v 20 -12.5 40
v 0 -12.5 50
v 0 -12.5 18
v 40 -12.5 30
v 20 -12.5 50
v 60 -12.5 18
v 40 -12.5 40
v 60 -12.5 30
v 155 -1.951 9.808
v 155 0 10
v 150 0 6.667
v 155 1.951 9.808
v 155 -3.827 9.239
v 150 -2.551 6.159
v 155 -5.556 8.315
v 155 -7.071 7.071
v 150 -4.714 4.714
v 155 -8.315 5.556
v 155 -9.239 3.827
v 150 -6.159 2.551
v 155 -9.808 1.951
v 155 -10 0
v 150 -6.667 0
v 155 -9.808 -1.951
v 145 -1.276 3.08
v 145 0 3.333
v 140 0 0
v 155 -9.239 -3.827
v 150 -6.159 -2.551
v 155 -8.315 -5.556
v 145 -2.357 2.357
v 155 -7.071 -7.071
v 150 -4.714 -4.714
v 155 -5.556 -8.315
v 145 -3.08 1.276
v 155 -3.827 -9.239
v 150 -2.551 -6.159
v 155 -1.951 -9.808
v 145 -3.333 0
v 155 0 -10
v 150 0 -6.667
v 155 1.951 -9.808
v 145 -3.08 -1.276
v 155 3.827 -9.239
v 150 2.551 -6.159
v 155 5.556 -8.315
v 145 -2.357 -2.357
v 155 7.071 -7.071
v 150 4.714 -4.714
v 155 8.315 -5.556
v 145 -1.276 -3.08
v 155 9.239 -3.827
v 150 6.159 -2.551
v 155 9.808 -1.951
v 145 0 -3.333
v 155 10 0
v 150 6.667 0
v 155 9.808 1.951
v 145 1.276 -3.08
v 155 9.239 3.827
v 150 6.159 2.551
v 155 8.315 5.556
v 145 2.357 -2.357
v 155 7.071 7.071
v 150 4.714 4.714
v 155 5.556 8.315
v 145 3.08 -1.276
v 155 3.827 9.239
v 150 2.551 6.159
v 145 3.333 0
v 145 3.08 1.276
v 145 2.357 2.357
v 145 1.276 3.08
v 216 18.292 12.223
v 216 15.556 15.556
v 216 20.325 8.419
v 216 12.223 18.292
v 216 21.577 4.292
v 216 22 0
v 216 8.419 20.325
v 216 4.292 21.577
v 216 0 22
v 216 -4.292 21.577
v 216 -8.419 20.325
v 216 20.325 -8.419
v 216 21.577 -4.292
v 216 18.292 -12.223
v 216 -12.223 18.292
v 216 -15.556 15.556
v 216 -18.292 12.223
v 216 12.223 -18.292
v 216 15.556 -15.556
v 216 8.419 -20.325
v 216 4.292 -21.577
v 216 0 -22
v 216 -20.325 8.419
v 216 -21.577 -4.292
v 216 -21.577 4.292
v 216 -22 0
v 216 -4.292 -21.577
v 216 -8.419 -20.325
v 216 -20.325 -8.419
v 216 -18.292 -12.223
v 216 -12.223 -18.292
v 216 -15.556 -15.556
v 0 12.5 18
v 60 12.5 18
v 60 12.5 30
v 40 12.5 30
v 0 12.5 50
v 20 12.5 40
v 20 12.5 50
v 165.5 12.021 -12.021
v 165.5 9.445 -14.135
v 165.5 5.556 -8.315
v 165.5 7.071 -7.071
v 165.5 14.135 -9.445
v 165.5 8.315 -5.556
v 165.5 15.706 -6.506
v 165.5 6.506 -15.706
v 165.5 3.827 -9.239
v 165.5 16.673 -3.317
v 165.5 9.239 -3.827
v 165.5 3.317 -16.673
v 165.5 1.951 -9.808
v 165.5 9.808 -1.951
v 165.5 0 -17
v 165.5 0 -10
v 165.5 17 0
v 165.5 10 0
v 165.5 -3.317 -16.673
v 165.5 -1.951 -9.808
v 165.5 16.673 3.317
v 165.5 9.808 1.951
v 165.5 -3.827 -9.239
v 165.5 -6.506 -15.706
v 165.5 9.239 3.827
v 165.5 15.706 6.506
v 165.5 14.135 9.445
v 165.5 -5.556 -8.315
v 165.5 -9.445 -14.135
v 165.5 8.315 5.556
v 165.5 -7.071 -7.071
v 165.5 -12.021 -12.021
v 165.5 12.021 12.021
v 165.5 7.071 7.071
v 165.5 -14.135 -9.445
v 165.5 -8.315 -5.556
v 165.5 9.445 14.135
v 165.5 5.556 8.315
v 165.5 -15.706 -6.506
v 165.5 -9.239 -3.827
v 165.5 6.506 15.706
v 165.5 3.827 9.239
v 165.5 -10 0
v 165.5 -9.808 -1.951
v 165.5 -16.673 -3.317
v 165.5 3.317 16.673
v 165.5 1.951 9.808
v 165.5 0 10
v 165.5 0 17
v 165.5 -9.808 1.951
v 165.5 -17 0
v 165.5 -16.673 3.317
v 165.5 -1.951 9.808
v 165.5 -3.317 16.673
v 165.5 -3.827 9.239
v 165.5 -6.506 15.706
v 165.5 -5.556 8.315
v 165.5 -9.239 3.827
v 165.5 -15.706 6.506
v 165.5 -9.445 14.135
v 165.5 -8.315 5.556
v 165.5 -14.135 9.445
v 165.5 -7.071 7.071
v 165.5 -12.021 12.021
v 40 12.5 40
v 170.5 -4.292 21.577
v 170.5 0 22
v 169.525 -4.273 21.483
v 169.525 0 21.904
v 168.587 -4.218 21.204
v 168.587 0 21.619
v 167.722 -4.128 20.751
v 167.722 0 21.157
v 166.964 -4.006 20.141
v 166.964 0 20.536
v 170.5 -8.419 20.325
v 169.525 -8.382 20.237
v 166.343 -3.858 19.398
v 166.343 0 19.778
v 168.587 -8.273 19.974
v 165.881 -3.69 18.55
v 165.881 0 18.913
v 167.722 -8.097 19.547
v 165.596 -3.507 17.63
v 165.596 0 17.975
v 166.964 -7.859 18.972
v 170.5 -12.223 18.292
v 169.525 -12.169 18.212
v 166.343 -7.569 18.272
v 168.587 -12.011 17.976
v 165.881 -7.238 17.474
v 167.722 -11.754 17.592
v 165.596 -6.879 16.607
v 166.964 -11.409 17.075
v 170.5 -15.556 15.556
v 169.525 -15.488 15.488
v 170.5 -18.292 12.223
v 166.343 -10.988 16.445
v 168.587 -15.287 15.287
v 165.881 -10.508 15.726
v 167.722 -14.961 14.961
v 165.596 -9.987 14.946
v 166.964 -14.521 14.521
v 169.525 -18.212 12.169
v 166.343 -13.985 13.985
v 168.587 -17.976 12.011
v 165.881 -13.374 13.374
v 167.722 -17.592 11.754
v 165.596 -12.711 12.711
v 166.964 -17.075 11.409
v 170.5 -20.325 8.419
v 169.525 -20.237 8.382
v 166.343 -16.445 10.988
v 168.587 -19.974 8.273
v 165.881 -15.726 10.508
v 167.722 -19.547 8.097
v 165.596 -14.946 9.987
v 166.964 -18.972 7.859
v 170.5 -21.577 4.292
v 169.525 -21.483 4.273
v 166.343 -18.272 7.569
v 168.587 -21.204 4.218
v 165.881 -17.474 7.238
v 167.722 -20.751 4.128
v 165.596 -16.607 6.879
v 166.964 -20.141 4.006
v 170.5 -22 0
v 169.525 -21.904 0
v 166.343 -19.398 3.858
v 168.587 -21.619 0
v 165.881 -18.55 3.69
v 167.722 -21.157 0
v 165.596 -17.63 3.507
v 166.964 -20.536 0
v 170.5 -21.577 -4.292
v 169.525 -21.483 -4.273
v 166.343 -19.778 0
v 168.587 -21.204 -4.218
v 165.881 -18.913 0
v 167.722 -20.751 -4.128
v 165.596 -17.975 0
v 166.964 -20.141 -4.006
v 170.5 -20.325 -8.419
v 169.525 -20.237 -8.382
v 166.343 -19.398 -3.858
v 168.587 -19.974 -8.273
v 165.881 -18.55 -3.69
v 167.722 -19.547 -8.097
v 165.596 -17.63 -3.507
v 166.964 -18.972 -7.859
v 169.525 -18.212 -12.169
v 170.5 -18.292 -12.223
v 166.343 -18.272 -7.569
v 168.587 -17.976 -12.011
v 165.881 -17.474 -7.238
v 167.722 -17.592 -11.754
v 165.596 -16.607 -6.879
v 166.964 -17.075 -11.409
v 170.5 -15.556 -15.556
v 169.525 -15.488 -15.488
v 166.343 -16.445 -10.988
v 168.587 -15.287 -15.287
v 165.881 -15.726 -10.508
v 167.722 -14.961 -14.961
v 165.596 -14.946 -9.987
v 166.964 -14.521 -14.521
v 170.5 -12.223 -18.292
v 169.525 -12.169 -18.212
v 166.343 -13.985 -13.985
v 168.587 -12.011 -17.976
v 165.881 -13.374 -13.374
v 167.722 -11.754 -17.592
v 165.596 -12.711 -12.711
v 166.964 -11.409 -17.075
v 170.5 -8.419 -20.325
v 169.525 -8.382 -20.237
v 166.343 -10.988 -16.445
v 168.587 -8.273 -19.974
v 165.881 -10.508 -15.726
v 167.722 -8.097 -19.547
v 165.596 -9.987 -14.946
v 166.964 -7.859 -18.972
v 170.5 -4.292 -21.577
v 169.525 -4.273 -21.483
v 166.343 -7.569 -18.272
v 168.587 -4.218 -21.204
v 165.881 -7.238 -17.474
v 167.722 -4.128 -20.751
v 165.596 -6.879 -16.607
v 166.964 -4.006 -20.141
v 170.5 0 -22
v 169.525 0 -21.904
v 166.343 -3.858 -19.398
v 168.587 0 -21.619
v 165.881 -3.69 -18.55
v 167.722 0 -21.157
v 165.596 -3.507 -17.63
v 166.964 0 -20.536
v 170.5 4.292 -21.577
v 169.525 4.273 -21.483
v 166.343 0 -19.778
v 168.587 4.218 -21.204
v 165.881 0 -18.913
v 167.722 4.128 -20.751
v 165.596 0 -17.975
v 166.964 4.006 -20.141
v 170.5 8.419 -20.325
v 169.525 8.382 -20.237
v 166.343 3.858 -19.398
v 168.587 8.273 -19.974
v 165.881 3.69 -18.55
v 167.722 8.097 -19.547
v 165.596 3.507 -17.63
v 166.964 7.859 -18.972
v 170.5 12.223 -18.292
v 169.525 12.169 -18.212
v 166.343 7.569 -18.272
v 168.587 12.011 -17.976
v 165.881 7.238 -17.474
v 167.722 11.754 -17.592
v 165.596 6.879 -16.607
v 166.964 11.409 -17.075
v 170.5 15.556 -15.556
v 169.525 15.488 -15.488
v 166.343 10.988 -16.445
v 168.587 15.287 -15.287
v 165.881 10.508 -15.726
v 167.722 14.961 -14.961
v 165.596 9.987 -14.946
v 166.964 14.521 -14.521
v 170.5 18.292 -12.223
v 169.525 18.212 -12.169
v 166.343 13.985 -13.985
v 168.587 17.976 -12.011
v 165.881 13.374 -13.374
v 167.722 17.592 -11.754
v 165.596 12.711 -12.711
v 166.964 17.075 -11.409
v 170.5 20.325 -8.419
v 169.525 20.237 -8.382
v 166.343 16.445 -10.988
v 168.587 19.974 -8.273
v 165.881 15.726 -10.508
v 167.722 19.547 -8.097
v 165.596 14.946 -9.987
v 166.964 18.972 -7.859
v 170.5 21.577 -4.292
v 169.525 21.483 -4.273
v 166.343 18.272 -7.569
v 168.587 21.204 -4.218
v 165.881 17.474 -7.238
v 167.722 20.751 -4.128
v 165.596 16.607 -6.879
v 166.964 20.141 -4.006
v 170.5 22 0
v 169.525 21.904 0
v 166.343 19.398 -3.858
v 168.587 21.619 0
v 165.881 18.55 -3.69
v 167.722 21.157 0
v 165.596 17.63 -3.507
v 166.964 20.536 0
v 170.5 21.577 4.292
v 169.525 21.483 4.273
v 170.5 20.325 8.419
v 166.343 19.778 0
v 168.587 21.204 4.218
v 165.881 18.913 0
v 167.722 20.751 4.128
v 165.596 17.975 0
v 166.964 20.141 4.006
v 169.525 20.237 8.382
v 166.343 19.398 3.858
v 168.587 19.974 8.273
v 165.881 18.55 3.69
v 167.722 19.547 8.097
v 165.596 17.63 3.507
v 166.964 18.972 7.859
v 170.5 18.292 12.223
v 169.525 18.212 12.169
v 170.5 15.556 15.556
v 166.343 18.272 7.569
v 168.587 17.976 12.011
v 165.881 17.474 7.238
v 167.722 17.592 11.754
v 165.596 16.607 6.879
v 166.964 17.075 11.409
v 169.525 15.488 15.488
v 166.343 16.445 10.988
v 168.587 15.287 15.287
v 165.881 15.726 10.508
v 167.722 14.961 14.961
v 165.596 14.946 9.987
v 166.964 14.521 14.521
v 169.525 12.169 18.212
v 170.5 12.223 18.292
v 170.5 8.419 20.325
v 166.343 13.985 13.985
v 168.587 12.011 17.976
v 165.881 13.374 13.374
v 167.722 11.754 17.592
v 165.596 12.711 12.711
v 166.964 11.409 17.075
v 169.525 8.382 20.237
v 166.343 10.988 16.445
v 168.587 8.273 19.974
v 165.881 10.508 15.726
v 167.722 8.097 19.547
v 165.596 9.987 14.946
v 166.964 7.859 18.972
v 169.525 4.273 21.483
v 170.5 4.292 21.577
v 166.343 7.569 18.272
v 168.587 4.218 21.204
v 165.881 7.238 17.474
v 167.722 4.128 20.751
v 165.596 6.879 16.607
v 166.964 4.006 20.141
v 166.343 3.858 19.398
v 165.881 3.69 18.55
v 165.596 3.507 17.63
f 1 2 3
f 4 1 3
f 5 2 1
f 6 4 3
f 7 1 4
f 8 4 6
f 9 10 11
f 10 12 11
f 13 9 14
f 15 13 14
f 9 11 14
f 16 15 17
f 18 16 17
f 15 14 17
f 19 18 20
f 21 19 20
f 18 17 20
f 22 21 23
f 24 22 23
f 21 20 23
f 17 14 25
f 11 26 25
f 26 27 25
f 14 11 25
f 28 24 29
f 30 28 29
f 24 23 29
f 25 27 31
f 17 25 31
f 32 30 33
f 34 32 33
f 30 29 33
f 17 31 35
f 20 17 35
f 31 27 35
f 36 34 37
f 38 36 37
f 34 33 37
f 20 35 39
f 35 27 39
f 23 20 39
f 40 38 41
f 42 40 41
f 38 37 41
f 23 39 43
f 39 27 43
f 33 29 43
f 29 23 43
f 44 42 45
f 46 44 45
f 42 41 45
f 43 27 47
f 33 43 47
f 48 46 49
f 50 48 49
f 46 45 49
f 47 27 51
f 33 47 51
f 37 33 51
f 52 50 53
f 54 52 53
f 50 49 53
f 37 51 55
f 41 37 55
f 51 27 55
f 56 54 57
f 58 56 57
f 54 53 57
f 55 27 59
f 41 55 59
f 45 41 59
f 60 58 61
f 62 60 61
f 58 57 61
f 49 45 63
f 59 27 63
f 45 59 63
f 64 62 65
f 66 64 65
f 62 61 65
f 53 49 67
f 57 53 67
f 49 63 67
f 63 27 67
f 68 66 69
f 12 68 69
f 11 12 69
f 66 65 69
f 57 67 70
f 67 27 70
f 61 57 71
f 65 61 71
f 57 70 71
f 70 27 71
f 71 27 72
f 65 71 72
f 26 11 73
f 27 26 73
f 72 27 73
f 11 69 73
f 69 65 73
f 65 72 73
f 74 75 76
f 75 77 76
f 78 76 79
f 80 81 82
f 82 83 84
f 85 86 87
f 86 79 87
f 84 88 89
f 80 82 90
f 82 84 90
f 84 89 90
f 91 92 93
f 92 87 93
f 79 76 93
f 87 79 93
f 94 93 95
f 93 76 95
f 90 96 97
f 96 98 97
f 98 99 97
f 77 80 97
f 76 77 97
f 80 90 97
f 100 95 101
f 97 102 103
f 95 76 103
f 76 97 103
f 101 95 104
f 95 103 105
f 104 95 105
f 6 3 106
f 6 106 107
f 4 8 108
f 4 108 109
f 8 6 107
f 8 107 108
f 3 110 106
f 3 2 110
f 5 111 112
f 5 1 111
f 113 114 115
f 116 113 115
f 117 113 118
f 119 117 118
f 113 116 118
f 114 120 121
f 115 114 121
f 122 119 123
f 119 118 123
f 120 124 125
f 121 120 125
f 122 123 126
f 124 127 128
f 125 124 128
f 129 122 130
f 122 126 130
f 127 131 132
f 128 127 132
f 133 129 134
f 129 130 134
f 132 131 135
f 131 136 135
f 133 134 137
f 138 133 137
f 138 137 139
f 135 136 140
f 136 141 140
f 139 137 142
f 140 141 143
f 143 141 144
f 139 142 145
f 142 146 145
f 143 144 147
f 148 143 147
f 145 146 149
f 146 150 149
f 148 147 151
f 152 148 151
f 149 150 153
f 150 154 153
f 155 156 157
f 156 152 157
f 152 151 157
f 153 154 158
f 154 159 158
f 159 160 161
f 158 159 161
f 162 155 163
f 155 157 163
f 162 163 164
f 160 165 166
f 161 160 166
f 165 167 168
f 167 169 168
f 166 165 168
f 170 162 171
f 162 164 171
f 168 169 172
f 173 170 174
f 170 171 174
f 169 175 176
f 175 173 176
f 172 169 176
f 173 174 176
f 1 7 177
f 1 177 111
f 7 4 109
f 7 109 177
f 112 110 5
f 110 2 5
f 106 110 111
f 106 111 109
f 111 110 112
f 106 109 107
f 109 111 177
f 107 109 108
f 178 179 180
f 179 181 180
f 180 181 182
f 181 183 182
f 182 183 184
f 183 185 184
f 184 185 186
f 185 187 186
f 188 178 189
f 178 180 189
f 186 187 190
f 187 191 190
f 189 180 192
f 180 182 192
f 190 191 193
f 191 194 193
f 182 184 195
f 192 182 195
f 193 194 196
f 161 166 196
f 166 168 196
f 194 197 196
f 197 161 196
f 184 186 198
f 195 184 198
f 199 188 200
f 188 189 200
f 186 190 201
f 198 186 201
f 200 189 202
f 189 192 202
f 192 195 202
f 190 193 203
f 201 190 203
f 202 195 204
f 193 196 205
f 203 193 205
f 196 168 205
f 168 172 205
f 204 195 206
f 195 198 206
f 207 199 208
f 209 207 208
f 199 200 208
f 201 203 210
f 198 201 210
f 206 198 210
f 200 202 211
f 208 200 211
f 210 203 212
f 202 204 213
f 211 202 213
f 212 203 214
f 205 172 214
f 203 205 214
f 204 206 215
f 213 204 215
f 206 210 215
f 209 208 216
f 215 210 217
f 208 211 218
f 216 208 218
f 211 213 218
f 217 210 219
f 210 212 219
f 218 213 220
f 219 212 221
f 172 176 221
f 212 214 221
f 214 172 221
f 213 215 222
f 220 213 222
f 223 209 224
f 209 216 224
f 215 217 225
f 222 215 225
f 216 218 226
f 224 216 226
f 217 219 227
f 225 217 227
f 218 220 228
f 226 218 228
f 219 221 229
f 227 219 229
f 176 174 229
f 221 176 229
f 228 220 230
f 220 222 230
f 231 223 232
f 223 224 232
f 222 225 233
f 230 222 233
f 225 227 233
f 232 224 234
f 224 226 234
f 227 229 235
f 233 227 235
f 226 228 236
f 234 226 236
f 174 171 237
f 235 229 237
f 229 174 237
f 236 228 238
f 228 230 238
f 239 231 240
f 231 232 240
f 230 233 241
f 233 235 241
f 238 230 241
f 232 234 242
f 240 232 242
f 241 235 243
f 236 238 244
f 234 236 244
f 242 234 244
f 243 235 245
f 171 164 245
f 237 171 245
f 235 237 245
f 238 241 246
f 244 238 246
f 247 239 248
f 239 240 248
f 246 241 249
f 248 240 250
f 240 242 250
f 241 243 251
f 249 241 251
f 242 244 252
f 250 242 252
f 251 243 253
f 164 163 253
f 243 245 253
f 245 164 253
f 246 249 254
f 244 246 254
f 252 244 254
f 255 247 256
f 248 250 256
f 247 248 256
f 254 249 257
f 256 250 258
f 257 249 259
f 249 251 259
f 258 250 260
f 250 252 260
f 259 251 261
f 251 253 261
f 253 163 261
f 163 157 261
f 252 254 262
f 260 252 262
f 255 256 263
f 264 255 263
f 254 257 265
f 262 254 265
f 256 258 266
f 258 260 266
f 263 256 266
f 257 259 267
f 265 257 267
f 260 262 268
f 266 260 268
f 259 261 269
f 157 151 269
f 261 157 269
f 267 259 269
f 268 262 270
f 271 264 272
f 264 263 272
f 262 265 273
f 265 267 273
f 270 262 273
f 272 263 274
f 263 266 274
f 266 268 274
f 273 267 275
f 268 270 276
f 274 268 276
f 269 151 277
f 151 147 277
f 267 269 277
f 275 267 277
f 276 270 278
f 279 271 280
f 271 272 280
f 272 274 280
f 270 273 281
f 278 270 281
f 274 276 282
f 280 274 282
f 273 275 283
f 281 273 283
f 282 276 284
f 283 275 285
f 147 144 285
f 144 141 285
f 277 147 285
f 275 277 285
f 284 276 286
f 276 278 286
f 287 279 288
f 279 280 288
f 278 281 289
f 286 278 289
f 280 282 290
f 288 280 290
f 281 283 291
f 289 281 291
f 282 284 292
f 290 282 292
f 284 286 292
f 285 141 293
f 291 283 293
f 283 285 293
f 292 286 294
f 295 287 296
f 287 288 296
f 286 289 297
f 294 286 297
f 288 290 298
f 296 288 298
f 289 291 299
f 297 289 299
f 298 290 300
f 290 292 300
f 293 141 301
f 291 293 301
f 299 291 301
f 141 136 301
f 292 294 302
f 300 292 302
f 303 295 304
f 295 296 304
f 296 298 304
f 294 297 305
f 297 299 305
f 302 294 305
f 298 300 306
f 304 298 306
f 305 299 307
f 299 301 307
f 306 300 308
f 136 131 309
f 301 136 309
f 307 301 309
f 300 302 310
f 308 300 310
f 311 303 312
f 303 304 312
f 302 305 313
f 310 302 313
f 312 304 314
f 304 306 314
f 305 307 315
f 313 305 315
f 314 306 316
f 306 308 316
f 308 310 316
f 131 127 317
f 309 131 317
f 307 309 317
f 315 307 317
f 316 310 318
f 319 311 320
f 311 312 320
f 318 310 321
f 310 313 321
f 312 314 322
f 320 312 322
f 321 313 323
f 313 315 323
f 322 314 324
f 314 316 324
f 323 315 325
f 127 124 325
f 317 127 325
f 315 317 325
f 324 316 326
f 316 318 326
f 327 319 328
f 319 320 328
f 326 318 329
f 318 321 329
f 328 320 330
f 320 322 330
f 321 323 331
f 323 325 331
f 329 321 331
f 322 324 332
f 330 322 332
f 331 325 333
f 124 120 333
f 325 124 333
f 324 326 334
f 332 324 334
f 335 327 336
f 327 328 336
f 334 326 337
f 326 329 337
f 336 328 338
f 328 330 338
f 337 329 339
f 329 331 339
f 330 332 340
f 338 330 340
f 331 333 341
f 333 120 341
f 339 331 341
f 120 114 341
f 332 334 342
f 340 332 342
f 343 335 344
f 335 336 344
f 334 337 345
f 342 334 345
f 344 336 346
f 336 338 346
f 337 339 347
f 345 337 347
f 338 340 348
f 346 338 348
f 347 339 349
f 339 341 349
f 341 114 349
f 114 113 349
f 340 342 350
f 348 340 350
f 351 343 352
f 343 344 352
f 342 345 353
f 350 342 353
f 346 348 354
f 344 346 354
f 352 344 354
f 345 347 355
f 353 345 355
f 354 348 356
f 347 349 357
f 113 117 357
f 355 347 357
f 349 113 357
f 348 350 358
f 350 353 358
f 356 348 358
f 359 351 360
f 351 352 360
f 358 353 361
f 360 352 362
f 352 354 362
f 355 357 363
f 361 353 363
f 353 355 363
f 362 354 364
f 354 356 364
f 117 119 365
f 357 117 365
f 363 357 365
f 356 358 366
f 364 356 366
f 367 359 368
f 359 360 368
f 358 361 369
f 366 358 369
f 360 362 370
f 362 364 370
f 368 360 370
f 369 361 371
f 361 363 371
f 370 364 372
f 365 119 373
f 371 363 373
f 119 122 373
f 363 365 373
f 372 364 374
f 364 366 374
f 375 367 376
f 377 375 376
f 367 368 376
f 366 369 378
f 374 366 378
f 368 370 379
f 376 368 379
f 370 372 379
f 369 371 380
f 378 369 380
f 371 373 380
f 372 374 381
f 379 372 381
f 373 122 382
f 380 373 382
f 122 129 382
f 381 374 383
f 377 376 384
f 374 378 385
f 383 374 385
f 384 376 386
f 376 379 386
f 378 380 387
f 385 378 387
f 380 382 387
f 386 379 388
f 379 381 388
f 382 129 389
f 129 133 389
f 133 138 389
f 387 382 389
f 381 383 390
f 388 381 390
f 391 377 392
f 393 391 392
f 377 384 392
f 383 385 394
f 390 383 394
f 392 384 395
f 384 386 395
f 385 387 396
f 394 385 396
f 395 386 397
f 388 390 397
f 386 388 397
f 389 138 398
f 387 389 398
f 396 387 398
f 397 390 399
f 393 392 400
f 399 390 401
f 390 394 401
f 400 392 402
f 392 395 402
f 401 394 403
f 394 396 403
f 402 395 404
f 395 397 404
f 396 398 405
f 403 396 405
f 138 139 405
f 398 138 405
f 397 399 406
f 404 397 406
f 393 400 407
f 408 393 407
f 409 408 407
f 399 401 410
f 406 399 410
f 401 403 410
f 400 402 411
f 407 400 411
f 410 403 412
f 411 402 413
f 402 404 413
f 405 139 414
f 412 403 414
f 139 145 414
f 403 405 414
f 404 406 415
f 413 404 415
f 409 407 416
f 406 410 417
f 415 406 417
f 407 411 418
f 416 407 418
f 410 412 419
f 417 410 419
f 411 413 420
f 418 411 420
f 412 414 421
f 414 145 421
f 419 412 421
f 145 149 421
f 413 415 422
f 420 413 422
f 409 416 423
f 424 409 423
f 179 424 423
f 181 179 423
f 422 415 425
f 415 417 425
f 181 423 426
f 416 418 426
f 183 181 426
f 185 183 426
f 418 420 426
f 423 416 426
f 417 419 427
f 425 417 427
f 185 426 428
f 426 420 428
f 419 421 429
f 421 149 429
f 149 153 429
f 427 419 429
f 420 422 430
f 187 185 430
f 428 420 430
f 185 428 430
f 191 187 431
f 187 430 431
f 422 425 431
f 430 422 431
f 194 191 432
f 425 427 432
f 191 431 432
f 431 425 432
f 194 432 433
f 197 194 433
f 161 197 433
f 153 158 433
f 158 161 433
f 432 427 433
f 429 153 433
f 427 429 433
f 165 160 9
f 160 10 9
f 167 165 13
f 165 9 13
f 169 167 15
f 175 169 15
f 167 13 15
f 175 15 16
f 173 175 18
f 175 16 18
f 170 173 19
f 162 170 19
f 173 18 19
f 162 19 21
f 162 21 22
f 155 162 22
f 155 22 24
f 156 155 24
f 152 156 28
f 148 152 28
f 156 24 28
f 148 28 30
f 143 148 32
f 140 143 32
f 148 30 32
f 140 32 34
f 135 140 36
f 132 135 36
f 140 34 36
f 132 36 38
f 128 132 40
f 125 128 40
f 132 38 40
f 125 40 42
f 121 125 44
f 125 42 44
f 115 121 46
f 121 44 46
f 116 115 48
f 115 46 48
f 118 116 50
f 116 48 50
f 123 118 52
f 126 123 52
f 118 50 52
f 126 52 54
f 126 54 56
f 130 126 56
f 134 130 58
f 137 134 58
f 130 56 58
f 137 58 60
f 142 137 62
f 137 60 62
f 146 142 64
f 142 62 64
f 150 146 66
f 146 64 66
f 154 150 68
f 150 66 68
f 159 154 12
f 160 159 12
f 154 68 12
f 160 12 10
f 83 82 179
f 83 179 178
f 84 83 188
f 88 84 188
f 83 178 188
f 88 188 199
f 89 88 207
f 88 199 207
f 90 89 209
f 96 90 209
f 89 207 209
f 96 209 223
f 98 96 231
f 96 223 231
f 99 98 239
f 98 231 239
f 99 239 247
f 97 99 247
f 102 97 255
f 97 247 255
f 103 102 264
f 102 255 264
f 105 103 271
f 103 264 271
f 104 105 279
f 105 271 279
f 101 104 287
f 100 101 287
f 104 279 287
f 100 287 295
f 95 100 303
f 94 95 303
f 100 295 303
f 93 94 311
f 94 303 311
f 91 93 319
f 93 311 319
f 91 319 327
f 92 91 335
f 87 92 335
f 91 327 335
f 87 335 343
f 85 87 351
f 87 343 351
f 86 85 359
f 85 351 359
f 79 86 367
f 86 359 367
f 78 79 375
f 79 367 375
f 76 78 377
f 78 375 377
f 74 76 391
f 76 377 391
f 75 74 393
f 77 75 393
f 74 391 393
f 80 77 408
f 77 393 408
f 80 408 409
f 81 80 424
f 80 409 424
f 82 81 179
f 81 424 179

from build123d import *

# Parameters (mm, degrees)
F0_W     = 20
F0_H     = 10
F1_DEPTH = 12.5
F0_W_2   = 25.5
F0_W_3   = 10.5


with BuildPart() as f1:
    # F0 (on Front) → F1 (new body, symmetric)
    with BuildSketch(Plane.XZ):
        with Locations((10, 45)):
            Rectangle(F0_W, F0_H)
        Polygon((40, 30), (0, 30), (0, 18), (60, 18), (60, 30), align=None)
        Polygon((20, 40), (0, 40), (0, 30), (40, 30), (40, 40), align=None)
    extrude(amount=F1_DEPTH, both=True)


with BuildPart() as f2:
    # F0 (on Front) → F2 (revolve)
    with BuildSketch(Plane.XZ):
        with Locations((178.25, 5)):
            Rectangle(F0_W_2, F0_H)
        with Locations((160.25, 5)):
            Rectangle(F0_W_3, F0_H)
        Polygon((155, 10), (140, 0), (155, 0), align=None)
        with BuildLine():
            Line((165.5, 17), (165.5, 10))
            Line((165.5, 10), (191, 10))
            Line((191, 10), (191, 22))
            Line((191, 22), (170.5, 22))
            ThreePointArc((170.5, 22), (166.9644660941, 20.5355339059), (165.5, 17))
        make_face()
        Polygon((191, 22), (191, 10), (191, 0), (216, 0), (216, 22), align=None)
    revolve(axis=Axis((178.25, 0, 0), (1, 0, 0)))


solid = Compound([f1.part, f2.part])
